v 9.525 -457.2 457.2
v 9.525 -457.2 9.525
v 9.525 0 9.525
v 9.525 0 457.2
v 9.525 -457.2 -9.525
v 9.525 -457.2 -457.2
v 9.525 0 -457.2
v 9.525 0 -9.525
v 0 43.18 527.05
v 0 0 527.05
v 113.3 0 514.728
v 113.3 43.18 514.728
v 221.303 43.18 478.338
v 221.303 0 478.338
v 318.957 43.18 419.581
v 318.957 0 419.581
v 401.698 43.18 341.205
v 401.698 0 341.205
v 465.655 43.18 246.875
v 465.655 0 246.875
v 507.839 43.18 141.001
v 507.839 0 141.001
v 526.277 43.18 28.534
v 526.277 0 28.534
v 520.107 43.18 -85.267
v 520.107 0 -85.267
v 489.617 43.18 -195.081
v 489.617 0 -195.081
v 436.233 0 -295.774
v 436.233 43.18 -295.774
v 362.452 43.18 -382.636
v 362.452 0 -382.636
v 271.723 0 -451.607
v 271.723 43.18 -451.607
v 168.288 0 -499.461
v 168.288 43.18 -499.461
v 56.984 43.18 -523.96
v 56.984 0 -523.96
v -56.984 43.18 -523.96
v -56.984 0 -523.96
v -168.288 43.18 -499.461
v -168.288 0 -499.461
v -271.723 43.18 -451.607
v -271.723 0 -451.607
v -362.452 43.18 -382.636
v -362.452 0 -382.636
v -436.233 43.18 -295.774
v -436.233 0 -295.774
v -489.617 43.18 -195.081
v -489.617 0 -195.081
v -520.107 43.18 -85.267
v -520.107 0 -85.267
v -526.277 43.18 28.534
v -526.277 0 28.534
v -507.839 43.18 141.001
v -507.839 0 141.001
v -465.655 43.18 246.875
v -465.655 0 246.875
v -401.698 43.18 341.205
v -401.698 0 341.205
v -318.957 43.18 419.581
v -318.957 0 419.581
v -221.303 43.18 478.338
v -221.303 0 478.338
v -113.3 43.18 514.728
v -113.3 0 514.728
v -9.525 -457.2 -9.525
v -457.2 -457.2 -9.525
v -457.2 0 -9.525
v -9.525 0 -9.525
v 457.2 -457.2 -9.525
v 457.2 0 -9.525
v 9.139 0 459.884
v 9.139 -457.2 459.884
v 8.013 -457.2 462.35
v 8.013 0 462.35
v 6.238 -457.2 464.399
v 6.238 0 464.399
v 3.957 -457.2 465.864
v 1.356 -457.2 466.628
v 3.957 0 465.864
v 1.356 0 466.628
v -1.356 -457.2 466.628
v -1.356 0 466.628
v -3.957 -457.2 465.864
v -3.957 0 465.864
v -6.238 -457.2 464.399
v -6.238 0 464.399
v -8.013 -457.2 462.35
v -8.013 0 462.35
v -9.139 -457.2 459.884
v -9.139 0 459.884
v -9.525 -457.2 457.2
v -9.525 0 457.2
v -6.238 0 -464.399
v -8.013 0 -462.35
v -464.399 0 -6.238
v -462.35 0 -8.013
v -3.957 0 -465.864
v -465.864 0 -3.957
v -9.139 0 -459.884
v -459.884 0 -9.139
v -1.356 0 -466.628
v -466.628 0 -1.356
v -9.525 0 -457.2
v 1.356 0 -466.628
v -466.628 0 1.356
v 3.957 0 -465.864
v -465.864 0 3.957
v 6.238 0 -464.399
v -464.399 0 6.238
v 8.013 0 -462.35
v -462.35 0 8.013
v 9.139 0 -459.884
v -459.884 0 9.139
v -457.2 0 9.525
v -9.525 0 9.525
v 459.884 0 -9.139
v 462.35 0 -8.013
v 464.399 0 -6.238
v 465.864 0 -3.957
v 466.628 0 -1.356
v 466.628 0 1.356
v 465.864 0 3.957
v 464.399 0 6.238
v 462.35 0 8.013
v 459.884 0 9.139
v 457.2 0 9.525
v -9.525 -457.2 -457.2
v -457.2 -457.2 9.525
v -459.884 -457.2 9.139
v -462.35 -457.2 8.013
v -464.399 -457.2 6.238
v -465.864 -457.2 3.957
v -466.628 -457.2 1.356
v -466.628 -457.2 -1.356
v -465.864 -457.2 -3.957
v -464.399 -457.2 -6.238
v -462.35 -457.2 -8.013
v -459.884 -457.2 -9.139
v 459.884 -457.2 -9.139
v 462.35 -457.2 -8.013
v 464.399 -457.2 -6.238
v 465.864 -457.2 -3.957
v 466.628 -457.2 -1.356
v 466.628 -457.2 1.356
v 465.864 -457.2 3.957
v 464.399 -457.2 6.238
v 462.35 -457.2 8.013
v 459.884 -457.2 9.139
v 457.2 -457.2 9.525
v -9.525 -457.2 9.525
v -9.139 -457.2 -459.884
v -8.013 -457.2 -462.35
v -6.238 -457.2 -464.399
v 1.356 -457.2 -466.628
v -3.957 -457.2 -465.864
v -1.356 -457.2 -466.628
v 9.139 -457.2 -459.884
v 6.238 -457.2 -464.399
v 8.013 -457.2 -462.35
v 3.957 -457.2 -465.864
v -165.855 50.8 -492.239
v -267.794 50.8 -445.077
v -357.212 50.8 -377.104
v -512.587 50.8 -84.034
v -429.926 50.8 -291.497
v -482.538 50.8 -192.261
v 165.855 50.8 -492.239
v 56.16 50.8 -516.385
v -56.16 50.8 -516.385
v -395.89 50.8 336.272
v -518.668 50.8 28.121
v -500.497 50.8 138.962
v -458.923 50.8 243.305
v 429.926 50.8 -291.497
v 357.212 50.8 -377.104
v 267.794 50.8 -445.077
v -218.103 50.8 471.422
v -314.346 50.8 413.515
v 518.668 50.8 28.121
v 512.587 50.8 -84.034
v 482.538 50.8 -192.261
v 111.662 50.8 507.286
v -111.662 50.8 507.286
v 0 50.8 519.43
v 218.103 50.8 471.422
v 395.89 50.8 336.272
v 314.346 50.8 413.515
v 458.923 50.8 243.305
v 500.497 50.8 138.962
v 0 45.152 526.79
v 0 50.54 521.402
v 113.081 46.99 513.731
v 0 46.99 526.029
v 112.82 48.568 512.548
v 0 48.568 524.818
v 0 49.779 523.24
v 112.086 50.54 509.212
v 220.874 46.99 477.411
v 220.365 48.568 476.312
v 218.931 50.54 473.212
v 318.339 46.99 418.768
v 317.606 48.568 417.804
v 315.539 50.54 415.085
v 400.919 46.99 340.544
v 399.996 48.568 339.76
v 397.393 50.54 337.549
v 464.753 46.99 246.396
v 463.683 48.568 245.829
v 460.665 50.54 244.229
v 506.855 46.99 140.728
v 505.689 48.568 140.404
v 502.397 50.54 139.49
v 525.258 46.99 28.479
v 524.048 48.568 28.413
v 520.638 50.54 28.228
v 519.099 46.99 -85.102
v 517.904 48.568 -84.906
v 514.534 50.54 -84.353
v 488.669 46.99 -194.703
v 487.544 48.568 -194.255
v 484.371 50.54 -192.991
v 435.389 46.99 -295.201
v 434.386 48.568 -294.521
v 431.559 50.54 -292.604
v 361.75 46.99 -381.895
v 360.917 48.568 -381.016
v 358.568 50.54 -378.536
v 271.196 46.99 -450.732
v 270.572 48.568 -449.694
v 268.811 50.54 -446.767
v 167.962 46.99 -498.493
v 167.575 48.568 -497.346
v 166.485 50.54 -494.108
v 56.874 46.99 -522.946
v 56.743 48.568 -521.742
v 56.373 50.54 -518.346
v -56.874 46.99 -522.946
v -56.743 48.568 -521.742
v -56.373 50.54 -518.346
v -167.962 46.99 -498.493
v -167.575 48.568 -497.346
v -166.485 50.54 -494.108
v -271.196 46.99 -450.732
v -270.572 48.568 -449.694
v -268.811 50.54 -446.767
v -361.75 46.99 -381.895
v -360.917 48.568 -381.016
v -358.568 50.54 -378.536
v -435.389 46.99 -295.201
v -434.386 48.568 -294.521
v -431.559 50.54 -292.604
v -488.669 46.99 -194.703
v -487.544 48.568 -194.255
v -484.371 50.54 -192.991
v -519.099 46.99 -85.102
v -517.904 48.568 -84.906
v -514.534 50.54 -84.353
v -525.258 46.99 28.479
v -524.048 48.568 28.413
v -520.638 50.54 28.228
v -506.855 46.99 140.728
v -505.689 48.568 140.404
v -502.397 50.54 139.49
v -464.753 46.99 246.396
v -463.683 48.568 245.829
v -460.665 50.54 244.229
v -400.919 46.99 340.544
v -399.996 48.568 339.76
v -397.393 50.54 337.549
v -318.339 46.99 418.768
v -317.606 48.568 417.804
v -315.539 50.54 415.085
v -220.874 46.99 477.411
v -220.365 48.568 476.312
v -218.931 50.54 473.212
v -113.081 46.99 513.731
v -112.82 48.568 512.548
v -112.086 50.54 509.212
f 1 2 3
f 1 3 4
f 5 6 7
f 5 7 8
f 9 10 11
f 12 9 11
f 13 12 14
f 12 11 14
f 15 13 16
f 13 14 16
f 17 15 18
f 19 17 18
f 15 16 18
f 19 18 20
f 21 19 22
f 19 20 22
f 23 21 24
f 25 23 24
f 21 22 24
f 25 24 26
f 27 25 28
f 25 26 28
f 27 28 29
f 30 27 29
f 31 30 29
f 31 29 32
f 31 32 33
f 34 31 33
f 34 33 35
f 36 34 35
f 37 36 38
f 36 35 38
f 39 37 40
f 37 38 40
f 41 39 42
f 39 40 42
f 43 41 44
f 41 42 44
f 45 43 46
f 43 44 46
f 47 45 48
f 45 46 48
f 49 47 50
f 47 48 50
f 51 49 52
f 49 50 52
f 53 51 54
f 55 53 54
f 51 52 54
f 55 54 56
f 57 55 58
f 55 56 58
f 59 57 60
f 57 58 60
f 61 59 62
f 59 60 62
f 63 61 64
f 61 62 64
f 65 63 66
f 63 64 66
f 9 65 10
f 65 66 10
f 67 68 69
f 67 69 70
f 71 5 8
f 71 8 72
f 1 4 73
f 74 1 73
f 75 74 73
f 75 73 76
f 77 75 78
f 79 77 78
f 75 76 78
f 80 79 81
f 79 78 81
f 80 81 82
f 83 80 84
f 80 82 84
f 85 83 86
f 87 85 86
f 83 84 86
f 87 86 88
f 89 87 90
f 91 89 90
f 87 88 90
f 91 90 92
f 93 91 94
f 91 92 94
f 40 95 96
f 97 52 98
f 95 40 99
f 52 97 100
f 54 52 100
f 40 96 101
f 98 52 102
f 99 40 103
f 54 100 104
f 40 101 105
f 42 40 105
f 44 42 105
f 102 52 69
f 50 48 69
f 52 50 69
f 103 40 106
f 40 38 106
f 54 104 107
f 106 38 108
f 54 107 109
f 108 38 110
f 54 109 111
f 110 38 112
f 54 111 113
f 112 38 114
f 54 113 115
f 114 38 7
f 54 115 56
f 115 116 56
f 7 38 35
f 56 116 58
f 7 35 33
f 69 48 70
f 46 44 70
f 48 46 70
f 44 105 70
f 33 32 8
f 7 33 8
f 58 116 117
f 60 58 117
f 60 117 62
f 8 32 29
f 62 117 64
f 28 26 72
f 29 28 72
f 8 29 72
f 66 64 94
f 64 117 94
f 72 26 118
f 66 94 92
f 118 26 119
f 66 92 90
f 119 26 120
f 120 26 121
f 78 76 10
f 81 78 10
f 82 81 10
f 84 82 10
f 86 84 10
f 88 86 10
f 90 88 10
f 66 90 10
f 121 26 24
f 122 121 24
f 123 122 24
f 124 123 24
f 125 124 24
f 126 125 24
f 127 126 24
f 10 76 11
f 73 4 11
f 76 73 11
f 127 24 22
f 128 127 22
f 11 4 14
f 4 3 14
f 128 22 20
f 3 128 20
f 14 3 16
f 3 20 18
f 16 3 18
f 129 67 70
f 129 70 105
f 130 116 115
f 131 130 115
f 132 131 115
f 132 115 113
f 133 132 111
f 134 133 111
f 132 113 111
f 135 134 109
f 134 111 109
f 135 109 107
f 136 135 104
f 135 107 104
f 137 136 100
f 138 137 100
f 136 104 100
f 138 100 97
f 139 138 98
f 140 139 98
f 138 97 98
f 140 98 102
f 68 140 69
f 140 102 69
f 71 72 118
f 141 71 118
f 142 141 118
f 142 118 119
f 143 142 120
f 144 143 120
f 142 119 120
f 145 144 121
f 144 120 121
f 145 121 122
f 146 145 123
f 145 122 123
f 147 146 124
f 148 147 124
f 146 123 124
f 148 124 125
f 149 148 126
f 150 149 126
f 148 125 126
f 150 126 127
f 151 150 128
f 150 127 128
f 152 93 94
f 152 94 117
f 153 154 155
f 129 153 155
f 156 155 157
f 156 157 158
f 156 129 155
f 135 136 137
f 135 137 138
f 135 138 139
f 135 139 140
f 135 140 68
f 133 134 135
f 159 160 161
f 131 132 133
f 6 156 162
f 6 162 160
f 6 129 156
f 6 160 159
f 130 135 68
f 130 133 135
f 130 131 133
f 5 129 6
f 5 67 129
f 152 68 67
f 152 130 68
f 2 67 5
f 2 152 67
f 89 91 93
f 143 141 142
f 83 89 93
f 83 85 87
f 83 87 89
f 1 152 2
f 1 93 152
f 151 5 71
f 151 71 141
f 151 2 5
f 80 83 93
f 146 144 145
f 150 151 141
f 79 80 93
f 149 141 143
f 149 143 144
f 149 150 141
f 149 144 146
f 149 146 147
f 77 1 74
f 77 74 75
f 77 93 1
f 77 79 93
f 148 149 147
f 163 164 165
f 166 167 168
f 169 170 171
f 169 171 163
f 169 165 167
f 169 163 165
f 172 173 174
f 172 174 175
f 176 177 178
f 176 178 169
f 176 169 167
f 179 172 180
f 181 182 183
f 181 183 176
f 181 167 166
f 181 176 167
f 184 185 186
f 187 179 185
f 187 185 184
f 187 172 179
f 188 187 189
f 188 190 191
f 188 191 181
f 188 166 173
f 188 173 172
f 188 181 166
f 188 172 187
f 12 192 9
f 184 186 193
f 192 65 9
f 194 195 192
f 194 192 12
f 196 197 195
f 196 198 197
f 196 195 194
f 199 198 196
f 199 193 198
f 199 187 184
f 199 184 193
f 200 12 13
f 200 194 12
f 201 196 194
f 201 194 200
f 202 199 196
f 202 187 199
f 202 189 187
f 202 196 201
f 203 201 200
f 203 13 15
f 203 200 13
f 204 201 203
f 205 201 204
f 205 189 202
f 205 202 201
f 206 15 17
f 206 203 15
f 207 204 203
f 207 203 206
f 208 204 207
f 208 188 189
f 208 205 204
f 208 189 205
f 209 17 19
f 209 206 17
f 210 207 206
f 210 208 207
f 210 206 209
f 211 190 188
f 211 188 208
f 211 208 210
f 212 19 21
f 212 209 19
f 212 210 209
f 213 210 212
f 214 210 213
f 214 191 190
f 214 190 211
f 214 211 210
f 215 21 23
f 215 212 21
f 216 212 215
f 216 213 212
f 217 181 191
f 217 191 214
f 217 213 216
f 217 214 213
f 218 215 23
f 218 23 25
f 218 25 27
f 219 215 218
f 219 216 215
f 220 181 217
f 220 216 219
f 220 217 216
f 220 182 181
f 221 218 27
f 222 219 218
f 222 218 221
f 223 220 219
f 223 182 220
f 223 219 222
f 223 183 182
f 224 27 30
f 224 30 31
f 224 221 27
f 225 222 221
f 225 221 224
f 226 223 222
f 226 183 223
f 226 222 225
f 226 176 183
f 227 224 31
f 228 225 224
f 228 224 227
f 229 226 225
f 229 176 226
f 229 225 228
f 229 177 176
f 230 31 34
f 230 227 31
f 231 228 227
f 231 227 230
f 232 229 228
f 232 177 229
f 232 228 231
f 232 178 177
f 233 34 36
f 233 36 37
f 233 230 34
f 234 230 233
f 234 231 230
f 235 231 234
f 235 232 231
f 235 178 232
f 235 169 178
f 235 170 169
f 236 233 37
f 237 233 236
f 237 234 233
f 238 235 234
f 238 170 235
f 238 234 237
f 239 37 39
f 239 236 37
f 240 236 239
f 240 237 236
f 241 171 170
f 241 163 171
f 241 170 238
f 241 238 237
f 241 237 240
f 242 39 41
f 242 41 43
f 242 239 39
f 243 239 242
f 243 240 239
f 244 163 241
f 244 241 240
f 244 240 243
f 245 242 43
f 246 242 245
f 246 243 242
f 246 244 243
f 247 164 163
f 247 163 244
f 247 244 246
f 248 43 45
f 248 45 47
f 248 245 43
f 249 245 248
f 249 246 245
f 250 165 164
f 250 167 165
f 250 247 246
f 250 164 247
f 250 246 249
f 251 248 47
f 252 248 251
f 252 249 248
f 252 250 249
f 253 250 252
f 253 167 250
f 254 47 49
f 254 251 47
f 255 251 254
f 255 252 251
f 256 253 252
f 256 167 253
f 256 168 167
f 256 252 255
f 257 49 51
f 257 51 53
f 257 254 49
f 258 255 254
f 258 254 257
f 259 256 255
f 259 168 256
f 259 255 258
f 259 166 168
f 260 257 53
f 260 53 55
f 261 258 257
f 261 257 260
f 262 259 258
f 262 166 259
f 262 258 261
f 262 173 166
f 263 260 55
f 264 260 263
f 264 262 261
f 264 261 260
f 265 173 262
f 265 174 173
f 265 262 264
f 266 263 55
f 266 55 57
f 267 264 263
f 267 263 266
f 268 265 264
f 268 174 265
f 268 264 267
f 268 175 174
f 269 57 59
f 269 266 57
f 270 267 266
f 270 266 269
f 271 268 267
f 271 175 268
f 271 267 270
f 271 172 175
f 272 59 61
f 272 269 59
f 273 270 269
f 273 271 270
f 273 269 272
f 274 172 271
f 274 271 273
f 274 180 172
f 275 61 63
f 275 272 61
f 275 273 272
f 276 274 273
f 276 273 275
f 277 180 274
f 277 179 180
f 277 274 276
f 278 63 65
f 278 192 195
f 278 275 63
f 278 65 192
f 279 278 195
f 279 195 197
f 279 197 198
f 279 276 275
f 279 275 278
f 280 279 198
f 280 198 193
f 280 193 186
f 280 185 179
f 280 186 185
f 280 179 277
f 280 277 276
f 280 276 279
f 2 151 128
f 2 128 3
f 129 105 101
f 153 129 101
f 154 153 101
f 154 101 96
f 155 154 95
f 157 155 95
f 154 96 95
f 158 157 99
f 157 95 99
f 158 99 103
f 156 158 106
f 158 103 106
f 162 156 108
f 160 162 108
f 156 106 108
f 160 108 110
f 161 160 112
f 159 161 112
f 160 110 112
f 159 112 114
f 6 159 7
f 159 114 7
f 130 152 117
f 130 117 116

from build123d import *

# Parameters (mm, degrees)
SKETCH1_R           = 527.05
BOSS_EXTRUDE1_DEPTH = 50.8
FILLET1_R           = 7.62
BOSS_EXTRUDE2_DEPTH = 457.2


with BuildPart() as part:
    # Sketch1 → Boss-Extrude1 (new body)
    with BuildSketch(Plane(origin=(0, 0, 0), x_dir=(1, 0, 0), z_dir=(0, 1, 0))):
        with Locations(Location((0, 0, 0), (0, 0, 270))):
            Circle(SKETCH1_R)
    extrude(amount=BOSS_EXTRUDE1_DEPTH)

    # Fillet1
    fillet1_edges = [part.edges().sort_by_distance(p)[0] for p in [
        (0, 50.8, -527.05),
    ]]
    fillet(fillet1_edges, radius=FILLET1_R)

    # Sketch2 → Boss-Extrude2 (add)
    with BuildSketch(Plane.XZ):
        with BuildLine():
            Line((-9.525, 457.2), (-9.525, -457.2))
            ThreePointArc((-9.525, -457.2), (0, -466.725), (9.525, -457.2))
            Line((9.525, -457.2), (9.525, 457.2))
            ThreePointArc((9.525, 457.2), (0, 466.725), (-9.525, 457.2))
        make_face()
        with BuildLine():
            Line((-457.2, -9.525), (457.2, -9.525))
            ThreePointArc((457.2, -9.525), (466.725, 0), (457.2, 9.525))
            Line((457.2, 9.525), (-457.2, 9.525))
            ThreePointArc((-457.2, 9.525), (-466.725, 0), (-457.2, -9.525))
        make_face()
    extrude(amount=BOSS_EXTRUDE2_DEPTH)


solid = part.part
